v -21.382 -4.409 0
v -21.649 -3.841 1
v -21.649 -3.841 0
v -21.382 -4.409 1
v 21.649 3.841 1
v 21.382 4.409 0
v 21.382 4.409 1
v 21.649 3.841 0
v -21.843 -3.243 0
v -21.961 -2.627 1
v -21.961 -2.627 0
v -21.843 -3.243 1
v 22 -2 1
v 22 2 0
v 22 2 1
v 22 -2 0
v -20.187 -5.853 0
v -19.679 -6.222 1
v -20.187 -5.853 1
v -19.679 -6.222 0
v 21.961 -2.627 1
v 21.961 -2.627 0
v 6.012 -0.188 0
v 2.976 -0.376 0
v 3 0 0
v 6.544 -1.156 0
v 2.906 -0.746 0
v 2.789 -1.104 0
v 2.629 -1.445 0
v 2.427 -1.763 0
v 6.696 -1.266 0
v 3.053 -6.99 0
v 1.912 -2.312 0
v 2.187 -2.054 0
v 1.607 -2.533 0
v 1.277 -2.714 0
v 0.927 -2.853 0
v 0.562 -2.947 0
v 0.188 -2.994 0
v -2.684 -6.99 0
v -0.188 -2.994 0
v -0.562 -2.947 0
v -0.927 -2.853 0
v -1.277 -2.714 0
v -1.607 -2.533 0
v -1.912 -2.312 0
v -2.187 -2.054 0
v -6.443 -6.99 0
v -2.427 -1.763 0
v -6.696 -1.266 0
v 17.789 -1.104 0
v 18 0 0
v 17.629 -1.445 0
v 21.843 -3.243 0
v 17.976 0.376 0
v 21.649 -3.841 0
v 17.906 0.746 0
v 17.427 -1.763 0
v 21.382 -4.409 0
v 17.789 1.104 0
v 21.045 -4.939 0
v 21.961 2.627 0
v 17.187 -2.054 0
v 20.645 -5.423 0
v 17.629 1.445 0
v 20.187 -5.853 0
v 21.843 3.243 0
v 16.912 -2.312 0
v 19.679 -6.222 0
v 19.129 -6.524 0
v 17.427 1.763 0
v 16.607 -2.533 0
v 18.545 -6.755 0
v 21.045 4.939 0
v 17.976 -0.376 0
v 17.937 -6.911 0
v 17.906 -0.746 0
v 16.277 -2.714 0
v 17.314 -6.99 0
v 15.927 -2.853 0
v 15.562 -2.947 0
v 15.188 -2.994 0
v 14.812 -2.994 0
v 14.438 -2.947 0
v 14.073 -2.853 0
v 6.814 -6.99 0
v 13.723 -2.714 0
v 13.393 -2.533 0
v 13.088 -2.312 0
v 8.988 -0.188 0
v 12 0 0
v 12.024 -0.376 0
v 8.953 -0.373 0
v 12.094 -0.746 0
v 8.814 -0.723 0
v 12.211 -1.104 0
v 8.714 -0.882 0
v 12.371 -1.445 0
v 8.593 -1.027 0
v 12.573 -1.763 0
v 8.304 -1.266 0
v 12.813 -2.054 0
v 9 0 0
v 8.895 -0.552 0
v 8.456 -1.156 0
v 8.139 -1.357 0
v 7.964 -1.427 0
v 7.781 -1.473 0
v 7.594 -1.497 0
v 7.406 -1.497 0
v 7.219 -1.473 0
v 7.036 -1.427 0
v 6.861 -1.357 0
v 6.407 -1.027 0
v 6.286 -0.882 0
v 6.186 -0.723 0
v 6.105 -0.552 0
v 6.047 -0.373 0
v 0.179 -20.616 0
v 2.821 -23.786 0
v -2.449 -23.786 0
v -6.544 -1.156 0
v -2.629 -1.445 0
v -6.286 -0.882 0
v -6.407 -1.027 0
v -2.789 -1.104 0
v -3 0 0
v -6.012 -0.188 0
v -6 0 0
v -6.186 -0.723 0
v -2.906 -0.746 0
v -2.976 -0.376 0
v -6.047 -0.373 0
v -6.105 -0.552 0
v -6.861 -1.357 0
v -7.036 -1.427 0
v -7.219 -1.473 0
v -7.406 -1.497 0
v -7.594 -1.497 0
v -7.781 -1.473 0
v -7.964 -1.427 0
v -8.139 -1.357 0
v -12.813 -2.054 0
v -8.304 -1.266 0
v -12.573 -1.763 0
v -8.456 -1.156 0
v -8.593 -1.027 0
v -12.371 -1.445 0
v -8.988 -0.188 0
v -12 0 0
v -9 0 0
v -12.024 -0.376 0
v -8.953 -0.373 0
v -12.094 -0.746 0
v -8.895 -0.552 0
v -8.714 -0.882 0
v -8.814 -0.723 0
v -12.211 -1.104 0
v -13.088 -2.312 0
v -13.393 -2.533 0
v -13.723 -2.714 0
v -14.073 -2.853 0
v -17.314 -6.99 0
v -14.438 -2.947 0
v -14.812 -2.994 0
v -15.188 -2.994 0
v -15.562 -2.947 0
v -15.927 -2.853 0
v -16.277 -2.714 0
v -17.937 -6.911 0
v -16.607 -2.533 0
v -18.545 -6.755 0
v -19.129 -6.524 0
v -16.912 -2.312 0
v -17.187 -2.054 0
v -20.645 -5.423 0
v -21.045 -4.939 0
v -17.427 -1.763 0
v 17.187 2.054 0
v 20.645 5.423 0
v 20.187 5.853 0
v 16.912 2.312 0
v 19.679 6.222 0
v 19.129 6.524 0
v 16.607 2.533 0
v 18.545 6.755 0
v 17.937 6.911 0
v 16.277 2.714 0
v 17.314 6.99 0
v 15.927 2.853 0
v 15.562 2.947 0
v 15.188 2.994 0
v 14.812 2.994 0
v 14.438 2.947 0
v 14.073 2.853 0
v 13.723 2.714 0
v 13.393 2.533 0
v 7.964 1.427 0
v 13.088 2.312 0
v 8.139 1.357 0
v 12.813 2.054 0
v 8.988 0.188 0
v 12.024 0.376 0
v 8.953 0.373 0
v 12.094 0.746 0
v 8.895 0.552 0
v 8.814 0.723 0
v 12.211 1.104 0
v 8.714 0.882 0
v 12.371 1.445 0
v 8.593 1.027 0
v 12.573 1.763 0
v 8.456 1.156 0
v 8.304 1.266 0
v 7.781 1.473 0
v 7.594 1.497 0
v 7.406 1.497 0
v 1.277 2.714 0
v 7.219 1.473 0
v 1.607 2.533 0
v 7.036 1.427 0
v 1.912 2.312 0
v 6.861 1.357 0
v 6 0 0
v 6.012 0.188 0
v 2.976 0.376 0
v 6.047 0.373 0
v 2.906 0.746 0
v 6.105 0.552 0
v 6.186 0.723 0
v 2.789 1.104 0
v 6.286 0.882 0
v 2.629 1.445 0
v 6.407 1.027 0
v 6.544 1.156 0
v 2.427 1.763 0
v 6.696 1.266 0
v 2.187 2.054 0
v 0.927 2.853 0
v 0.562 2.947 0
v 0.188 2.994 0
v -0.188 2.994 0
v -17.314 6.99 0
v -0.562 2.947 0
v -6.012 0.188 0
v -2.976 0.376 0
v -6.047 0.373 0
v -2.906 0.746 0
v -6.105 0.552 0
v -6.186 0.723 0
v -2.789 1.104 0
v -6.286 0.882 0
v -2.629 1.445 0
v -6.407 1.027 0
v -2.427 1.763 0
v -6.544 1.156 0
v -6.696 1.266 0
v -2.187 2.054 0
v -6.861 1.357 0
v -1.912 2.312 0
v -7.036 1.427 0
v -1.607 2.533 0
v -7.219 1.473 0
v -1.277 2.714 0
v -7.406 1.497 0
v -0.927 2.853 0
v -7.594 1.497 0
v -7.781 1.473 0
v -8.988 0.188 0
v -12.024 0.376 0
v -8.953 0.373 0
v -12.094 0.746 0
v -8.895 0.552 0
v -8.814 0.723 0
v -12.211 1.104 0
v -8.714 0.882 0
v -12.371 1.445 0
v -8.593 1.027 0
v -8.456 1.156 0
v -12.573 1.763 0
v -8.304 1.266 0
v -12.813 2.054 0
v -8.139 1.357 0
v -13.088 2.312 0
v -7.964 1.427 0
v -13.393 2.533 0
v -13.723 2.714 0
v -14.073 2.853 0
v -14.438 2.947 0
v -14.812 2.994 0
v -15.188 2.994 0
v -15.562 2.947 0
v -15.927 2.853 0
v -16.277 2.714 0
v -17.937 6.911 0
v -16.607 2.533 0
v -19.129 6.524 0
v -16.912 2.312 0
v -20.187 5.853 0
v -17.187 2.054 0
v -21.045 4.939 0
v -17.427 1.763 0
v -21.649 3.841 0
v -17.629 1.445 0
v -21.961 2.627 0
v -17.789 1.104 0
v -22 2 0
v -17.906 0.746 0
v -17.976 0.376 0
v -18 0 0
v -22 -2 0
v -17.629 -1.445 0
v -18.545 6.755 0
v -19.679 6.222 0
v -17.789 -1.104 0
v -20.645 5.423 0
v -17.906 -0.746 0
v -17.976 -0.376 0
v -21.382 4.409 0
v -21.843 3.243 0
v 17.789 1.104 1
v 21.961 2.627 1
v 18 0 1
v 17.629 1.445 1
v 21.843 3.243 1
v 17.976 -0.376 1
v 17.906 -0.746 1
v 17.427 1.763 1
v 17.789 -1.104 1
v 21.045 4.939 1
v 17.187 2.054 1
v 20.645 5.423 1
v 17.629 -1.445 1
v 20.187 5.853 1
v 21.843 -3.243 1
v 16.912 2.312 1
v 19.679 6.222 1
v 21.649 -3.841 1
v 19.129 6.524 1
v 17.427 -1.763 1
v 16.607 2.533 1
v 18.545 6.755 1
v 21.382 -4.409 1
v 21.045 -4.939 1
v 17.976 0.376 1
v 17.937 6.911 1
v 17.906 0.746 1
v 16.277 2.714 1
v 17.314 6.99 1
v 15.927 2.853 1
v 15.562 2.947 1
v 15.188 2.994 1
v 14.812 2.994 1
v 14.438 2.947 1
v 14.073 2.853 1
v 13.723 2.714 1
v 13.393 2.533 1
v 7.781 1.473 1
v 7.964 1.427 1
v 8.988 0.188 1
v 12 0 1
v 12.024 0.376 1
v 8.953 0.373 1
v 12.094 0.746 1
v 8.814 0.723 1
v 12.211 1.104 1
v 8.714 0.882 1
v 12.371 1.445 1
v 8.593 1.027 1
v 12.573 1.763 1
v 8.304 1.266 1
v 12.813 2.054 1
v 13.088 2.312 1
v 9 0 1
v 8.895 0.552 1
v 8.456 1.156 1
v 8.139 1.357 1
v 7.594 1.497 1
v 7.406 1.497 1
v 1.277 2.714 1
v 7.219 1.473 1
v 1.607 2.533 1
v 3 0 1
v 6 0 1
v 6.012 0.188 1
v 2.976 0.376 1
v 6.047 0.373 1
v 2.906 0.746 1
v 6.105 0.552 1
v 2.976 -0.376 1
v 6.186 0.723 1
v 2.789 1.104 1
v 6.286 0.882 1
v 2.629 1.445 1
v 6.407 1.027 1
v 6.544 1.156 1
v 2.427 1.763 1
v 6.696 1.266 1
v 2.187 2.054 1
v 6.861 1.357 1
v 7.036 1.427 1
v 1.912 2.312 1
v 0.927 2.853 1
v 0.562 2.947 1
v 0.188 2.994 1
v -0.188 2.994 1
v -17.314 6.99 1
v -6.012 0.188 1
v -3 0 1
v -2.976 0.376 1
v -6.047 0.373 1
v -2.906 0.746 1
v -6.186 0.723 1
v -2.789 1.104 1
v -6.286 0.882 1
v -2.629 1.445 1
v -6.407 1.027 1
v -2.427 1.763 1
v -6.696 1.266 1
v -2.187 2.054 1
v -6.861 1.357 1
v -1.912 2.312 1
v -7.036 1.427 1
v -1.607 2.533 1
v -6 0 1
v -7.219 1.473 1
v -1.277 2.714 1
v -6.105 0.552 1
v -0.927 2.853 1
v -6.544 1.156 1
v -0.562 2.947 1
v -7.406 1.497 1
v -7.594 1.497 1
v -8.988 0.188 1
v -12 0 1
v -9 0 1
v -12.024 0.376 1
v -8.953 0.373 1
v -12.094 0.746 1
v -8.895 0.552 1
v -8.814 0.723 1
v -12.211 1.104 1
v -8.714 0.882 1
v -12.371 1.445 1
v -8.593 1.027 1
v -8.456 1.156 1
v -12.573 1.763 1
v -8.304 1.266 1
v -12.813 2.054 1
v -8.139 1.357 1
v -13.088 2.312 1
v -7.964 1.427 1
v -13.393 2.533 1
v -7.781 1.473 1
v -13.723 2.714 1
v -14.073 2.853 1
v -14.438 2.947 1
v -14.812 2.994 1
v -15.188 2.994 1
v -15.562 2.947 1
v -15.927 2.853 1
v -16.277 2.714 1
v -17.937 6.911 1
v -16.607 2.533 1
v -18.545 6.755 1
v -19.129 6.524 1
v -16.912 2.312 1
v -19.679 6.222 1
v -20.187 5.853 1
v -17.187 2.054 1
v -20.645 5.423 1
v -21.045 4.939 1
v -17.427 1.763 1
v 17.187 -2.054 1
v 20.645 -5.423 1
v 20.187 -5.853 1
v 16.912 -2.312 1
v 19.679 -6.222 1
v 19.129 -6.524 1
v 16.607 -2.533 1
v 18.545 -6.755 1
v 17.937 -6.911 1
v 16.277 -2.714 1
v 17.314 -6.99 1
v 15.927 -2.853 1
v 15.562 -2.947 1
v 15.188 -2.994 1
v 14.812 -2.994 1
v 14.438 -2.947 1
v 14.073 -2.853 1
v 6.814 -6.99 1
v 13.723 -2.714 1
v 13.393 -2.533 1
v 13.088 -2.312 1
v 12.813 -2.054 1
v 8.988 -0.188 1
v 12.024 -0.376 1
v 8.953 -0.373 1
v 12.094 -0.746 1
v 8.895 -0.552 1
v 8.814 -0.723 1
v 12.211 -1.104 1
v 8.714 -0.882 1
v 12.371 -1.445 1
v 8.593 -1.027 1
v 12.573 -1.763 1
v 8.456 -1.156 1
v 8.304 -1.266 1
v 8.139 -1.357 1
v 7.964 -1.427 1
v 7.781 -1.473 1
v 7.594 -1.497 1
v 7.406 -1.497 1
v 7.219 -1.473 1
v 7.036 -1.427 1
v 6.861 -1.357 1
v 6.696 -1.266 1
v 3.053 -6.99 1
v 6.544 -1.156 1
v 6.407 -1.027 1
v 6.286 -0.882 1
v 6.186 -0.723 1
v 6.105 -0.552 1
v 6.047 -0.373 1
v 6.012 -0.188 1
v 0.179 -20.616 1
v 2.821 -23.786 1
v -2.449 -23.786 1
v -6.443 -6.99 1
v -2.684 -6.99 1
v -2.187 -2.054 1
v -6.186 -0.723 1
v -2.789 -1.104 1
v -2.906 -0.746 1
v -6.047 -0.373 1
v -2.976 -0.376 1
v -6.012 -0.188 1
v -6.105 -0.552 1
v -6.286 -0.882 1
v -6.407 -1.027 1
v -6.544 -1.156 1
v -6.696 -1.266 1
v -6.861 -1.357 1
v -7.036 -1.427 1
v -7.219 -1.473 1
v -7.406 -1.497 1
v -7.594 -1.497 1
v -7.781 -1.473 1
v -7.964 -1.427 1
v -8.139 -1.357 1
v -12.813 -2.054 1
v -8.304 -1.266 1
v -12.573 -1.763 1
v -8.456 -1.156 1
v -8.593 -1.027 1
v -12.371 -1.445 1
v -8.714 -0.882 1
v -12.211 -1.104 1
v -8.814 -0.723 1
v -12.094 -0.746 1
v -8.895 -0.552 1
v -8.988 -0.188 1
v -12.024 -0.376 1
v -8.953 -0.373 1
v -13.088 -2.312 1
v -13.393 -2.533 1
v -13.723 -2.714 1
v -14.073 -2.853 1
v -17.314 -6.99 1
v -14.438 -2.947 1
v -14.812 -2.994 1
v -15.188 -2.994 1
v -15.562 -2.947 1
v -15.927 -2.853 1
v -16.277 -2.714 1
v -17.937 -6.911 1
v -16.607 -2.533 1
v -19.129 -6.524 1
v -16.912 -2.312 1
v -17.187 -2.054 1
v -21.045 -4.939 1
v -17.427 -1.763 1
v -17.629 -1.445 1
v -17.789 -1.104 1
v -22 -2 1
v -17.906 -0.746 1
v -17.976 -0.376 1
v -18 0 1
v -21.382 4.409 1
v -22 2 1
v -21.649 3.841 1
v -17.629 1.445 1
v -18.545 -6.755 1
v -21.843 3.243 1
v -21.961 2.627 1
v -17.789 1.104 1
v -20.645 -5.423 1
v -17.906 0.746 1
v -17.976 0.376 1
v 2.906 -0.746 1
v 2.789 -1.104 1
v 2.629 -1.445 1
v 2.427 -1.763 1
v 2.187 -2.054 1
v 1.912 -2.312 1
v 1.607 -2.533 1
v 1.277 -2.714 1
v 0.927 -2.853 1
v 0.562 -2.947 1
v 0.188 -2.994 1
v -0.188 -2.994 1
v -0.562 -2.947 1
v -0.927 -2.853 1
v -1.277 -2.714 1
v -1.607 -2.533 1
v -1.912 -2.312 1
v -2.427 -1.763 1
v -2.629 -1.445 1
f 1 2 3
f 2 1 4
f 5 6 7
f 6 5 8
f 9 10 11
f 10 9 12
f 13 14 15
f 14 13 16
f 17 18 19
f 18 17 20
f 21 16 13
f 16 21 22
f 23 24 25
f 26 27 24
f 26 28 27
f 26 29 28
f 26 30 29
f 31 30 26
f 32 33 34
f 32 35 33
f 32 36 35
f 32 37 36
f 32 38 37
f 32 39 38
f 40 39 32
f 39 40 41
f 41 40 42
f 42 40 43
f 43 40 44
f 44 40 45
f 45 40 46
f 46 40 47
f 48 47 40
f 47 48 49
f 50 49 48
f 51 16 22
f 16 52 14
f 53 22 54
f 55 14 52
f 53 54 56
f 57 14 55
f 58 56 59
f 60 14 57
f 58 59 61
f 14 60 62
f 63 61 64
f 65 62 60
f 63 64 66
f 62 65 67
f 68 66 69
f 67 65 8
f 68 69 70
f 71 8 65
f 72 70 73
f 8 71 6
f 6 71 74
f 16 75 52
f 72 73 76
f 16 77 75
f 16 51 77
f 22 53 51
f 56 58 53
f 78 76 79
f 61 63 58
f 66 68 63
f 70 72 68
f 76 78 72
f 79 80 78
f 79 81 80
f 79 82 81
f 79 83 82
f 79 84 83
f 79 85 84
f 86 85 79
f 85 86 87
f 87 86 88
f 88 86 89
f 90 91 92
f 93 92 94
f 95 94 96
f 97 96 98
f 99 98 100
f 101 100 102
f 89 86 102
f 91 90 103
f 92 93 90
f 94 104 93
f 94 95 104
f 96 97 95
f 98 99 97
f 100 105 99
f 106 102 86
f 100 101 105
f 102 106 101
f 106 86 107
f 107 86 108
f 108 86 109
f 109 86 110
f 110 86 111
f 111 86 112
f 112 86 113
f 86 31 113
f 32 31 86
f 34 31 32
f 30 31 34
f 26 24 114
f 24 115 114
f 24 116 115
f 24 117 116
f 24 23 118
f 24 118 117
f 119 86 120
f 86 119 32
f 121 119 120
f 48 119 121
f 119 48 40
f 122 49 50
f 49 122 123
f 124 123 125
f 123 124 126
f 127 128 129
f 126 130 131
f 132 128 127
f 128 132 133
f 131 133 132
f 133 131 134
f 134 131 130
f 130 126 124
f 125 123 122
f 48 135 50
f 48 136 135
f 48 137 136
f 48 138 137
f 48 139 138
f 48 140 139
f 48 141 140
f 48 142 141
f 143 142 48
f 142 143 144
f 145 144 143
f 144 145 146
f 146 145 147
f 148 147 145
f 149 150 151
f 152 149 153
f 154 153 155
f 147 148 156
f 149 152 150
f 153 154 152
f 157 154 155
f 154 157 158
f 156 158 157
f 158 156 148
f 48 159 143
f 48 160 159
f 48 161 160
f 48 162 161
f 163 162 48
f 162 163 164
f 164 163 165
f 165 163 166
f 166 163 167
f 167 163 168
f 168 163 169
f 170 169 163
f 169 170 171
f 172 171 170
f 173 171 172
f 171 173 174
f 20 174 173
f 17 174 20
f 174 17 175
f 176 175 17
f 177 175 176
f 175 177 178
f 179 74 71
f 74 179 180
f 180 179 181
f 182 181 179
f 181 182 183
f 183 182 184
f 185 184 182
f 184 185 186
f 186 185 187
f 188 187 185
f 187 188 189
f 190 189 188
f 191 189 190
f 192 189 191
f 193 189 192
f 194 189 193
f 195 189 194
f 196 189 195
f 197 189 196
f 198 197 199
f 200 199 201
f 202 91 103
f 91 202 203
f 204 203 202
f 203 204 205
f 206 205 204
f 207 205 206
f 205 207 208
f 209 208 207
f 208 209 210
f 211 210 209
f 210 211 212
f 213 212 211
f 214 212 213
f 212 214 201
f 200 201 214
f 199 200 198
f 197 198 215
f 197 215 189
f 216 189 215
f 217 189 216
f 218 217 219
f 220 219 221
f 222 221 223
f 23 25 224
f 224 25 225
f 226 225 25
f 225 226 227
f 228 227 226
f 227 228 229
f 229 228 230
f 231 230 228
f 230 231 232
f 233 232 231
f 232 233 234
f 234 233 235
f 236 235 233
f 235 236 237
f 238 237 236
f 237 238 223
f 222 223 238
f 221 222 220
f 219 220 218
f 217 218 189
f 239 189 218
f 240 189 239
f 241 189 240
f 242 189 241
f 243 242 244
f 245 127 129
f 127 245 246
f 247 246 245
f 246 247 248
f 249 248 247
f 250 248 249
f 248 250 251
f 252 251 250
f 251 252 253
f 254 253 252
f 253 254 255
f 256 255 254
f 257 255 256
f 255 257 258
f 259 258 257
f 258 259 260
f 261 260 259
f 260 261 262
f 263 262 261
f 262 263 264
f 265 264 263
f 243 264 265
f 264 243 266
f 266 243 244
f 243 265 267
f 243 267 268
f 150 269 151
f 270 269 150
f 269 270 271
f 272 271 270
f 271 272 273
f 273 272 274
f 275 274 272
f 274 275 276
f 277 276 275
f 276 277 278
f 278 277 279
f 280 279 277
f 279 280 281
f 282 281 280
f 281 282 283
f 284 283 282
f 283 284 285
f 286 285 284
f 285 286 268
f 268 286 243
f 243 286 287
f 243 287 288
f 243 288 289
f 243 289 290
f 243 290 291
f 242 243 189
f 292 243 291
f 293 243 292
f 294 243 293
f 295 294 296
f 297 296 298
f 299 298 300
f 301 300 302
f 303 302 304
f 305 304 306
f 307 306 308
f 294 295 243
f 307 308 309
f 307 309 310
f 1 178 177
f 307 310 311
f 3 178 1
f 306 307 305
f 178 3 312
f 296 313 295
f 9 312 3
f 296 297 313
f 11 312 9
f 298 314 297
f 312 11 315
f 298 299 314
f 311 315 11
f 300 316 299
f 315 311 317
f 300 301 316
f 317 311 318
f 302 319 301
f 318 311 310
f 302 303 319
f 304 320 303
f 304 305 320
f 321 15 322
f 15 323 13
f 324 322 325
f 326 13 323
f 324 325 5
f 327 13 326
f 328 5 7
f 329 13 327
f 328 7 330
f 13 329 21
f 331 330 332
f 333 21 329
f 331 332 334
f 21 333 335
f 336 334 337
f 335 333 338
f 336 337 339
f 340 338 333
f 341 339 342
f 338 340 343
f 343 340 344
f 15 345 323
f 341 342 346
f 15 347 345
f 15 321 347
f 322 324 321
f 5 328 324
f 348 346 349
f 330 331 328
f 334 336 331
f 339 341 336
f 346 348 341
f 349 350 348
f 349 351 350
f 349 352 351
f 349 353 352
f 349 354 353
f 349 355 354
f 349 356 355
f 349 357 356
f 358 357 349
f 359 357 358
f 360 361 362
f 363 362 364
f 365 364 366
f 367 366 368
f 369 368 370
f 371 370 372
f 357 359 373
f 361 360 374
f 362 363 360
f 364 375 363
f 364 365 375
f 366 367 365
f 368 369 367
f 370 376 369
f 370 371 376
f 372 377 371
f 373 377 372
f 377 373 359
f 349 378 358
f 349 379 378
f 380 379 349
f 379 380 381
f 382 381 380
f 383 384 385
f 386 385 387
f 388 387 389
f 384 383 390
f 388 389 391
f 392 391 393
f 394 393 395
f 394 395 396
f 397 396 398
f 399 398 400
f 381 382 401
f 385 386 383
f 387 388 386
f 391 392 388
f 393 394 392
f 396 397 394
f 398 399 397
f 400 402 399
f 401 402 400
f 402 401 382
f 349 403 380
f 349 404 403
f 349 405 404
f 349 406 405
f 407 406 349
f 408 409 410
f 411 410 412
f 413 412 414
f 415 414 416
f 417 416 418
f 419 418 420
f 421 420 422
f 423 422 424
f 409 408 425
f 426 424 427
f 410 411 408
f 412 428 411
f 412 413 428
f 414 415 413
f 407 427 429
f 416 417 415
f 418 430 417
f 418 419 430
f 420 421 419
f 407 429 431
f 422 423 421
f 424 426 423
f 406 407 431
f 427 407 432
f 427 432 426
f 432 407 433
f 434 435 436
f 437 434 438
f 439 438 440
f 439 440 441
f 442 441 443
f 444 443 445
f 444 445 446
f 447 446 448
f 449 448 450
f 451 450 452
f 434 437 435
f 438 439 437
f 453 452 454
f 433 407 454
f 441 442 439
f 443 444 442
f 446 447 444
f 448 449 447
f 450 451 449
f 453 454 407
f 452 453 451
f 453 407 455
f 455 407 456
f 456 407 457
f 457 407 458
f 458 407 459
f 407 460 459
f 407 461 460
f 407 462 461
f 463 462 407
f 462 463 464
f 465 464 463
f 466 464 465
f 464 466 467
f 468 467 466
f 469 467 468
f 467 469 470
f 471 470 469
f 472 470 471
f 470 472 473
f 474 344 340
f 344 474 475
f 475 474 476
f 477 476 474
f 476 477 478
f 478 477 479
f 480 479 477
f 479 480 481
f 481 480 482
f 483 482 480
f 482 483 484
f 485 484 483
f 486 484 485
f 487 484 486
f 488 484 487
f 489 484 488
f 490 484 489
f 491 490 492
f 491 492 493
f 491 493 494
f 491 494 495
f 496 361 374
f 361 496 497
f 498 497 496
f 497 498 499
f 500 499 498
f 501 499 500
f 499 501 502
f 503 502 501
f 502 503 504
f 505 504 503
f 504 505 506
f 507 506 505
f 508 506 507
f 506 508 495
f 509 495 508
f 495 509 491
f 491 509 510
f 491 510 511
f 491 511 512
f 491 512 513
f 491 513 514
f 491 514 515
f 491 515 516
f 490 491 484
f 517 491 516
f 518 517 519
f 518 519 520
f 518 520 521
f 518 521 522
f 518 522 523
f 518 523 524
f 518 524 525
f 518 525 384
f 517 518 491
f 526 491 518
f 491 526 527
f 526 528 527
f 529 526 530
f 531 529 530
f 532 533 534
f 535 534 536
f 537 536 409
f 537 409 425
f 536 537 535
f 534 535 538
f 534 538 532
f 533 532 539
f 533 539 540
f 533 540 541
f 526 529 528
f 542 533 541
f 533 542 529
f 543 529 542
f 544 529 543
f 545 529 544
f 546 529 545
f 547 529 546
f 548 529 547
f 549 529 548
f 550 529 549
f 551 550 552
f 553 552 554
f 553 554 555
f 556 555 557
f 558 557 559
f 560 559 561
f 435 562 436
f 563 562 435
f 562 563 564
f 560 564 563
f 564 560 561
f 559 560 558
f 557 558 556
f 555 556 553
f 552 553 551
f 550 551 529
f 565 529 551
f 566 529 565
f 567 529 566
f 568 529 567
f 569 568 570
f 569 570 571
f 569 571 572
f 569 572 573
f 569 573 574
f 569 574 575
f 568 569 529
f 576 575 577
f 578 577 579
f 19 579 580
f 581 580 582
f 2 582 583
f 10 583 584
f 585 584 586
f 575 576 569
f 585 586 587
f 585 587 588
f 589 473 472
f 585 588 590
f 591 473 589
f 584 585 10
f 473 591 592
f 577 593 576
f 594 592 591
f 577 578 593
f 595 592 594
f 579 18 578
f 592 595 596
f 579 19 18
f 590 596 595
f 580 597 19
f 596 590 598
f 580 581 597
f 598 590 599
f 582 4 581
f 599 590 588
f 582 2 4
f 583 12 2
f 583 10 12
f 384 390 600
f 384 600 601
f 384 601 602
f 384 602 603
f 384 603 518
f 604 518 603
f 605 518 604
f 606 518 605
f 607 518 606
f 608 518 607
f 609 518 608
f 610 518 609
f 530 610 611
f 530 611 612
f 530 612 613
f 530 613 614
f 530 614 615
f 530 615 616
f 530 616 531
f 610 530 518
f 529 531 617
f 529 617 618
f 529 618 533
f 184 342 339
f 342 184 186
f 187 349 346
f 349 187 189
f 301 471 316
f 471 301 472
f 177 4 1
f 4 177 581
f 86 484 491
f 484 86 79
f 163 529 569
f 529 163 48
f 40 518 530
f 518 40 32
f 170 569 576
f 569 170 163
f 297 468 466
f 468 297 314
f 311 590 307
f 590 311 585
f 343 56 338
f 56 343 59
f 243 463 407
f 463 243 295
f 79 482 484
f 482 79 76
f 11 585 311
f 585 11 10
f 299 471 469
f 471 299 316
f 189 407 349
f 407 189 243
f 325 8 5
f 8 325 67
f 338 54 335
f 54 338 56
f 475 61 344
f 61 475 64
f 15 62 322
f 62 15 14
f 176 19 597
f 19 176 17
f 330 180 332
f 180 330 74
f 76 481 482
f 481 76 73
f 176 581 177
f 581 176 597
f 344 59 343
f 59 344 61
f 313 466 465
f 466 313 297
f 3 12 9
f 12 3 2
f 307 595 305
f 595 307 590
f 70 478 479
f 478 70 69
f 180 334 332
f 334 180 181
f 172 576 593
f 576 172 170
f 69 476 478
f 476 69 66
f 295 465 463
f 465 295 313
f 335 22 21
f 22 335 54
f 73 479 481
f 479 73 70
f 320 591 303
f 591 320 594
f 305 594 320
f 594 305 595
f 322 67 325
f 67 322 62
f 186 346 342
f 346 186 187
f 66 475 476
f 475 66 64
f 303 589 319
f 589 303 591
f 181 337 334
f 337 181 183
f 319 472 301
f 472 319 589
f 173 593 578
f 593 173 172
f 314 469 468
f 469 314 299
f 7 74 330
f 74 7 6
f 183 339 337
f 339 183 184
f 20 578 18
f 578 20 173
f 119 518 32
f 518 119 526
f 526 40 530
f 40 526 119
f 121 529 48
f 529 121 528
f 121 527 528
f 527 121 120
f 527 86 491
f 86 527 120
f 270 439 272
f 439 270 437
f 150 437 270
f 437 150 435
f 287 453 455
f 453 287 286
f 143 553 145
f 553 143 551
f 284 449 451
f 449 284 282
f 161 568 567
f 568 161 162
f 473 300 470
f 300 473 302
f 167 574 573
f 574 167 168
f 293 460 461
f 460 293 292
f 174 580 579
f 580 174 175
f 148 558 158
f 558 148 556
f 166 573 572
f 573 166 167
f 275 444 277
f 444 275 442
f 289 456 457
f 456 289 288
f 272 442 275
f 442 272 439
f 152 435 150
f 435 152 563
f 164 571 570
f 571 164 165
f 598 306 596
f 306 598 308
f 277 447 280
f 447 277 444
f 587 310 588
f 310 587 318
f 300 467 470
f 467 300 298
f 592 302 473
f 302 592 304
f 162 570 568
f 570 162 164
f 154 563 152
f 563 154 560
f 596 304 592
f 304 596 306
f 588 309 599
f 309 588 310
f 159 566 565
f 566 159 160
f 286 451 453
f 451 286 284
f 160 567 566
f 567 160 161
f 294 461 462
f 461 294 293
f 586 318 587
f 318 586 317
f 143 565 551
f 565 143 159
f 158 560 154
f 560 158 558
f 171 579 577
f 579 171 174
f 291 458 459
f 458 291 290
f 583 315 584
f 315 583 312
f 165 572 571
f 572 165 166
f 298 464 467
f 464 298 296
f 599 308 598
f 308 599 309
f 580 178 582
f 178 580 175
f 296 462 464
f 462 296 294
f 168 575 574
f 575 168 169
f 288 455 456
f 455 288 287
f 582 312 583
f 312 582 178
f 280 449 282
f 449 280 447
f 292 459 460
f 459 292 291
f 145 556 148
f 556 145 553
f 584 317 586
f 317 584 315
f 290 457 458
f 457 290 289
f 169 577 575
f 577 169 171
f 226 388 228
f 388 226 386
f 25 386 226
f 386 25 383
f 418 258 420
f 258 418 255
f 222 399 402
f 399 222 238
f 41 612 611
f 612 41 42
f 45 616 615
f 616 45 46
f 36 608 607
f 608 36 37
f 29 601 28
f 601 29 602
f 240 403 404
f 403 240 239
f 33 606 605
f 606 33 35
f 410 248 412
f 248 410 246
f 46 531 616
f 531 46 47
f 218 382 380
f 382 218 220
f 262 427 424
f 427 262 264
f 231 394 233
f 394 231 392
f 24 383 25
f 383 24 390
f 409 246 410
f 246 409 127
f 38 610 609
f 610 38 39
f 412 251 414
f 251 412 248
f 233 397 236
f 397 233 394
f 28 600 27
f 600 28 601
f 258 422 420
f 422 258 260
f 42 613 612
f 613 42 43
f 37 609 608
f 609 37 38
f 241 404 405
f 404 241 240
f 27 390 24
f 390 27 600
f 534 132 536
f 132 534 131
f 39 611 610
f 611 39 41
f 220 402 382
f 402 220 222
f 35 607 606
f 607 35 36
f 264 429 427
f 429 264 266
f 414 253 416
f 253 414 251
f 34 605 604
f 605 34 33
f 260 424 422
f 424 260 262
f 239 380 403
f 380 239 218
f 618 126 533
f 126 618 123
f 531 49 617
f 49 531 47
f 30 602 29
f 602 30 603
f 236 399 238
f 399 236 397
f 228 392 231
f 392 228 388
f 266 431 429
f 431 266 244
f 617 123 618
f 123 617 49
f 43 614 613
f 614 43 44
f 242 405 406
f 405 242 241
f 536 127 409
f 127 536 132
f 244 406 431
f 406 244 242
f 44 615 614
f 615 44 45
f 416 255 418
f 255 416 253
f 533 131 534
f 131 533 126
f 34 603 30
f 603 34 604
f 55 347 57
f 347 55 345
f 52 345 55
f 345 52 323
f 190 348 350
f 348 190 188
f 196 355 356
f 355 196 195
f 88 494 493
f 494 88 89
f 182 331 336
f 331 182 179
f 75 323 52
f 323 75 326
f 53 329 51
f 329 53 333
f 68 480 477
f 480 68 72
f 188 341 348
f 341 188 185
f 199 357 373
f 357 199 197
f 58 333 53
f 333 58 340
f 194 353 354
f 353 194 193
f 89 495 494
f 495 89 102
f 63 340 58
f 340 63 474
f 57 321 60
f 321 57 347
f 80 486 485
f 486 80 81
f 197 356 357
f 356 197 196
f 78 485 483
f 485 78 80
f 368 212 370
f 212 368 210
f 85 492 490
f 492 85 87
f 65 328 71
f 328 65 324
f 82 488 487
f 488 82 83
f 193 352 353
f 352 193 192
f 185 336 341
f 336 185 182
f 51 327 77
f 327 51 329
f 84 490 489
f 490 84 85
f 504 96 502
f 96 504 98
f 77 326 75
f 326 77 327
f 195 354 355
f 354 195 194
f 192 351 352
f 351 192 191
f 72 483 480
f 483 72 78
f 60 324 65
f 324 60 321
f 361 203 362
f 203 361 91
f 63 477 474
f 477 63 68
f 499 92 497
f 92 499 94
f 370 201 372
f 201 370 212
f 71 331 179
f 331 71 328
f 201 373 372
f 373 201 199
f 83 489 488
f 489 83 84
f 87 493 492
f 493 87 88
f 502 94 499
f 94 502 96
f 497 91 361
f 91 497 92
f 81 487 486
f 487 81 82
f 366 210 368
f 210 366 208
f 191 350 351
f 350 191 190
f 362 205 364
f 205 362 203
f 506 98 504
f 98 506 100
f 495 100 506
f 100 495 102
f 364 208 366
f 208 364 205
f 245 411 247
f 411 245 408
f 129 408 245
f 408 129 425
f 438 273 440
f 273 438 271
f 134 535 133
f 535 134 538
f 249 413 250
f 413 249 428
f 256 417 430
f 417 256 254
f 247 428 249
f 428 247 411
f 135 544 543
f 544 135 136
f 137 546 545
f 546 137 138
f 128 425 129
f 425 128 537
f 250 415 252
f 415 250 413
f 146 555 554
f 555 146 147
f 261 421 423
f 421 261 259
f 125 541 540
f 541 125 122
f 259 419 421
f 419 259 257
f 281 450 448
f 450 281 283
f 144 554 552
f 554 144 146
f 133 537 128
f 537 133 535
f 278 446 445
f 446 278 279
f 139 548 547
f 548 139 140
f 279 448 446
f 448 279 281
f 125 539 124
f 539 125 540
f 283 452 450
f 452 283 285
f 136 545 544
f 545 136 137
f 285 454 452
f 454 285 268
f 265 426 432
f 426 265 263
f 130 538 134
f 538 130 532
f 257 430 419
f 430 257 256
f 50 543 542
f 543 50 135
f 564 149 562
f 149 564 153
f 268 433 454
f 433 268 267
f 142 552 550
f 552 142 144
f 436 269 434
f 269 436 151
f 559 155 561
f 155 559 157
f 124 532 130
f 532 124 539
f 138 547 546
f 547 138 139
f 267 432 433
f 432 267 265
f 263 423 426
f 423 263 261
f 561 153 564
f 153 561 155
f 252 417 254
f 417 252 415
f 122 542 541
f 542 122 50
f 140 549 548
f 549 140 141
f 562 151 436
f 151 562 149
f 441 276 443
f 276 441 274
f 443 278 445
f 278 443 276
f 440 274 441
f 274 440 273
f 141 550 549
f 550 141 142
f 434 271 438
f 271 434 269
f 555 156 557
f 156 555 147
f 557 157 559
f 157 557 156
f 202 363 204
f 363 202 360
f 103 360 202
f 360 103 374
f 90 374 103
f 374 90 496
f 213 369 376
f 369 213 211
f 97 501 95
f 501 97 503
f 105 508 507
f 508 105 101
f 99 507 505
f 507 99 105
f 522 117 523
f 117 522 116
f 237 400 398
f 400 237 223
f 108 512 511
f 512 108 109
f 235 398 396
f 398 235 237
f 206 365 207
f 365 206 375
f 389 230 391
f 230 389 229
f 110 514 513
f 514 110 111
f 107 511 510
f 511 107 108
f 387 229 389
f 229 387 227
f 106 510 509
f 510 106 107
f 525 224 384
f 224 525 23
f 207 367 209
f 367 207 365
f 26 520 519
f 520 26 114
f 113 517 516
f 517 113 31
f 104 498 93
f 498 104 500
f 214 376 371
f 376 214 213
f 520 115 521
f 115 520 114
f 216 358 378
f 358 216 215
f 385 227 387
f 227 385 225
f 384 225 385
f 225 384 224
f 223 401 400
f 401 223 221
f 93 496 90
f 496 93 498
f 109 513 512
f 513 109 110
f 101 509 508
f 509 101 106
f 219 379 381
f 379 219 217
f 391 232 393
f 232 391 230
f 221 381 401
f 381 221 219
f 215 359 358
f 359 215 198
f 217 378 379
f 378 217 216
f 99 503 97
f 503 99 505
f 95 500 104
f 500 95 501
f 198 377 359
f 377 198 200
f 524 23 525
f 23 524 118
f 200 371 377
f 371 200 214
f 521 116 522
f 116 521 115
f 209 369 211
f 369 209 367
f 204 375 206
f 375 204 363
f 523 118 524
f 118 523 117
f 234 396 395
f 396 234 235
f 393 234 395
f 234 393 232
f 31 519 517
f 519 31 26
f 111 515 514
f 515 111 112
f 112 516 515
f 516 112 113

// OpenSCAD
$fn = 50;


difference() {
	union() {
		hull() {
			translate(v = [-17.0000000000, 2.0000000000, 0]) {
				cylinder(h = 1, r = 5);
			}
			translate(v = [17.0000000000, 2.0000000000, 0]) {
				cylinder(h = 1, r = 5);
			}
			translate(v = [-17.0000000000, -2.0000000000, 0]) {
				cylinder(h = 1, r = 5);
			}
			translate(v = [17.0000000000, -2.0000000000, 0]) {
				cylinder(h = 1, r = 5);
			}
		}
		translate(v = [0, -5, 0]) {
			linear_extrude(height = 1) {
				text(font = "DejaVu Sans Mono:style=Bold", halign = "center", size = 19.0000000000, text = "V", valign = "top");
			}
		}
	}
	union() {
		translate(v = [-15.0000000000, 0.0000000000, 0]) {
			translate(v = [0, 0, -100]) {
				cylinder(h = 200, r = 3.0000000000);
			}
		}
		translate(v = [0, 0, -100]) {
			cylinder(h = 200, r = 3.0000000000);
		}
		translate(v = [15.0000000000, 0.0000000000, 0]) {
			translate(v = [0, 0, -100]) {
				cylinder(h = 200, r = 3.0000000000);
			}
		}
		translate(v = [-15.0000000000, 0.0000000000, 0]) {
			translate(v = [0, 0, -100]) {
				cylinder(h = 200, r = 1.5000000000);
			}
		}
		translate(v = [-7.5000000000, 0.0000000000, 0]) {
			translate(v = [0, 0, -100]) {
				cylinder(h = 200, r = 1.5000000000);
			}
		}
		translate(v = [0, 0, -100]) {
			cylinder(h = 200, r = 1.5000000000);
		}
		translate(v = [7.5000000000, 0.0000000000, 0]) {
			translate(v = [0, 0, -100]) {
				cylinder(h = 200, r = 1.5000000000);
			}
		}
		translate(v = [15.0000000000, 0.0000000000, 0]) {
			translate(v = [0, 0, -100]) {
				cylinder(h = 200, r = 1.5000000000);
			}
		}
	}
}
